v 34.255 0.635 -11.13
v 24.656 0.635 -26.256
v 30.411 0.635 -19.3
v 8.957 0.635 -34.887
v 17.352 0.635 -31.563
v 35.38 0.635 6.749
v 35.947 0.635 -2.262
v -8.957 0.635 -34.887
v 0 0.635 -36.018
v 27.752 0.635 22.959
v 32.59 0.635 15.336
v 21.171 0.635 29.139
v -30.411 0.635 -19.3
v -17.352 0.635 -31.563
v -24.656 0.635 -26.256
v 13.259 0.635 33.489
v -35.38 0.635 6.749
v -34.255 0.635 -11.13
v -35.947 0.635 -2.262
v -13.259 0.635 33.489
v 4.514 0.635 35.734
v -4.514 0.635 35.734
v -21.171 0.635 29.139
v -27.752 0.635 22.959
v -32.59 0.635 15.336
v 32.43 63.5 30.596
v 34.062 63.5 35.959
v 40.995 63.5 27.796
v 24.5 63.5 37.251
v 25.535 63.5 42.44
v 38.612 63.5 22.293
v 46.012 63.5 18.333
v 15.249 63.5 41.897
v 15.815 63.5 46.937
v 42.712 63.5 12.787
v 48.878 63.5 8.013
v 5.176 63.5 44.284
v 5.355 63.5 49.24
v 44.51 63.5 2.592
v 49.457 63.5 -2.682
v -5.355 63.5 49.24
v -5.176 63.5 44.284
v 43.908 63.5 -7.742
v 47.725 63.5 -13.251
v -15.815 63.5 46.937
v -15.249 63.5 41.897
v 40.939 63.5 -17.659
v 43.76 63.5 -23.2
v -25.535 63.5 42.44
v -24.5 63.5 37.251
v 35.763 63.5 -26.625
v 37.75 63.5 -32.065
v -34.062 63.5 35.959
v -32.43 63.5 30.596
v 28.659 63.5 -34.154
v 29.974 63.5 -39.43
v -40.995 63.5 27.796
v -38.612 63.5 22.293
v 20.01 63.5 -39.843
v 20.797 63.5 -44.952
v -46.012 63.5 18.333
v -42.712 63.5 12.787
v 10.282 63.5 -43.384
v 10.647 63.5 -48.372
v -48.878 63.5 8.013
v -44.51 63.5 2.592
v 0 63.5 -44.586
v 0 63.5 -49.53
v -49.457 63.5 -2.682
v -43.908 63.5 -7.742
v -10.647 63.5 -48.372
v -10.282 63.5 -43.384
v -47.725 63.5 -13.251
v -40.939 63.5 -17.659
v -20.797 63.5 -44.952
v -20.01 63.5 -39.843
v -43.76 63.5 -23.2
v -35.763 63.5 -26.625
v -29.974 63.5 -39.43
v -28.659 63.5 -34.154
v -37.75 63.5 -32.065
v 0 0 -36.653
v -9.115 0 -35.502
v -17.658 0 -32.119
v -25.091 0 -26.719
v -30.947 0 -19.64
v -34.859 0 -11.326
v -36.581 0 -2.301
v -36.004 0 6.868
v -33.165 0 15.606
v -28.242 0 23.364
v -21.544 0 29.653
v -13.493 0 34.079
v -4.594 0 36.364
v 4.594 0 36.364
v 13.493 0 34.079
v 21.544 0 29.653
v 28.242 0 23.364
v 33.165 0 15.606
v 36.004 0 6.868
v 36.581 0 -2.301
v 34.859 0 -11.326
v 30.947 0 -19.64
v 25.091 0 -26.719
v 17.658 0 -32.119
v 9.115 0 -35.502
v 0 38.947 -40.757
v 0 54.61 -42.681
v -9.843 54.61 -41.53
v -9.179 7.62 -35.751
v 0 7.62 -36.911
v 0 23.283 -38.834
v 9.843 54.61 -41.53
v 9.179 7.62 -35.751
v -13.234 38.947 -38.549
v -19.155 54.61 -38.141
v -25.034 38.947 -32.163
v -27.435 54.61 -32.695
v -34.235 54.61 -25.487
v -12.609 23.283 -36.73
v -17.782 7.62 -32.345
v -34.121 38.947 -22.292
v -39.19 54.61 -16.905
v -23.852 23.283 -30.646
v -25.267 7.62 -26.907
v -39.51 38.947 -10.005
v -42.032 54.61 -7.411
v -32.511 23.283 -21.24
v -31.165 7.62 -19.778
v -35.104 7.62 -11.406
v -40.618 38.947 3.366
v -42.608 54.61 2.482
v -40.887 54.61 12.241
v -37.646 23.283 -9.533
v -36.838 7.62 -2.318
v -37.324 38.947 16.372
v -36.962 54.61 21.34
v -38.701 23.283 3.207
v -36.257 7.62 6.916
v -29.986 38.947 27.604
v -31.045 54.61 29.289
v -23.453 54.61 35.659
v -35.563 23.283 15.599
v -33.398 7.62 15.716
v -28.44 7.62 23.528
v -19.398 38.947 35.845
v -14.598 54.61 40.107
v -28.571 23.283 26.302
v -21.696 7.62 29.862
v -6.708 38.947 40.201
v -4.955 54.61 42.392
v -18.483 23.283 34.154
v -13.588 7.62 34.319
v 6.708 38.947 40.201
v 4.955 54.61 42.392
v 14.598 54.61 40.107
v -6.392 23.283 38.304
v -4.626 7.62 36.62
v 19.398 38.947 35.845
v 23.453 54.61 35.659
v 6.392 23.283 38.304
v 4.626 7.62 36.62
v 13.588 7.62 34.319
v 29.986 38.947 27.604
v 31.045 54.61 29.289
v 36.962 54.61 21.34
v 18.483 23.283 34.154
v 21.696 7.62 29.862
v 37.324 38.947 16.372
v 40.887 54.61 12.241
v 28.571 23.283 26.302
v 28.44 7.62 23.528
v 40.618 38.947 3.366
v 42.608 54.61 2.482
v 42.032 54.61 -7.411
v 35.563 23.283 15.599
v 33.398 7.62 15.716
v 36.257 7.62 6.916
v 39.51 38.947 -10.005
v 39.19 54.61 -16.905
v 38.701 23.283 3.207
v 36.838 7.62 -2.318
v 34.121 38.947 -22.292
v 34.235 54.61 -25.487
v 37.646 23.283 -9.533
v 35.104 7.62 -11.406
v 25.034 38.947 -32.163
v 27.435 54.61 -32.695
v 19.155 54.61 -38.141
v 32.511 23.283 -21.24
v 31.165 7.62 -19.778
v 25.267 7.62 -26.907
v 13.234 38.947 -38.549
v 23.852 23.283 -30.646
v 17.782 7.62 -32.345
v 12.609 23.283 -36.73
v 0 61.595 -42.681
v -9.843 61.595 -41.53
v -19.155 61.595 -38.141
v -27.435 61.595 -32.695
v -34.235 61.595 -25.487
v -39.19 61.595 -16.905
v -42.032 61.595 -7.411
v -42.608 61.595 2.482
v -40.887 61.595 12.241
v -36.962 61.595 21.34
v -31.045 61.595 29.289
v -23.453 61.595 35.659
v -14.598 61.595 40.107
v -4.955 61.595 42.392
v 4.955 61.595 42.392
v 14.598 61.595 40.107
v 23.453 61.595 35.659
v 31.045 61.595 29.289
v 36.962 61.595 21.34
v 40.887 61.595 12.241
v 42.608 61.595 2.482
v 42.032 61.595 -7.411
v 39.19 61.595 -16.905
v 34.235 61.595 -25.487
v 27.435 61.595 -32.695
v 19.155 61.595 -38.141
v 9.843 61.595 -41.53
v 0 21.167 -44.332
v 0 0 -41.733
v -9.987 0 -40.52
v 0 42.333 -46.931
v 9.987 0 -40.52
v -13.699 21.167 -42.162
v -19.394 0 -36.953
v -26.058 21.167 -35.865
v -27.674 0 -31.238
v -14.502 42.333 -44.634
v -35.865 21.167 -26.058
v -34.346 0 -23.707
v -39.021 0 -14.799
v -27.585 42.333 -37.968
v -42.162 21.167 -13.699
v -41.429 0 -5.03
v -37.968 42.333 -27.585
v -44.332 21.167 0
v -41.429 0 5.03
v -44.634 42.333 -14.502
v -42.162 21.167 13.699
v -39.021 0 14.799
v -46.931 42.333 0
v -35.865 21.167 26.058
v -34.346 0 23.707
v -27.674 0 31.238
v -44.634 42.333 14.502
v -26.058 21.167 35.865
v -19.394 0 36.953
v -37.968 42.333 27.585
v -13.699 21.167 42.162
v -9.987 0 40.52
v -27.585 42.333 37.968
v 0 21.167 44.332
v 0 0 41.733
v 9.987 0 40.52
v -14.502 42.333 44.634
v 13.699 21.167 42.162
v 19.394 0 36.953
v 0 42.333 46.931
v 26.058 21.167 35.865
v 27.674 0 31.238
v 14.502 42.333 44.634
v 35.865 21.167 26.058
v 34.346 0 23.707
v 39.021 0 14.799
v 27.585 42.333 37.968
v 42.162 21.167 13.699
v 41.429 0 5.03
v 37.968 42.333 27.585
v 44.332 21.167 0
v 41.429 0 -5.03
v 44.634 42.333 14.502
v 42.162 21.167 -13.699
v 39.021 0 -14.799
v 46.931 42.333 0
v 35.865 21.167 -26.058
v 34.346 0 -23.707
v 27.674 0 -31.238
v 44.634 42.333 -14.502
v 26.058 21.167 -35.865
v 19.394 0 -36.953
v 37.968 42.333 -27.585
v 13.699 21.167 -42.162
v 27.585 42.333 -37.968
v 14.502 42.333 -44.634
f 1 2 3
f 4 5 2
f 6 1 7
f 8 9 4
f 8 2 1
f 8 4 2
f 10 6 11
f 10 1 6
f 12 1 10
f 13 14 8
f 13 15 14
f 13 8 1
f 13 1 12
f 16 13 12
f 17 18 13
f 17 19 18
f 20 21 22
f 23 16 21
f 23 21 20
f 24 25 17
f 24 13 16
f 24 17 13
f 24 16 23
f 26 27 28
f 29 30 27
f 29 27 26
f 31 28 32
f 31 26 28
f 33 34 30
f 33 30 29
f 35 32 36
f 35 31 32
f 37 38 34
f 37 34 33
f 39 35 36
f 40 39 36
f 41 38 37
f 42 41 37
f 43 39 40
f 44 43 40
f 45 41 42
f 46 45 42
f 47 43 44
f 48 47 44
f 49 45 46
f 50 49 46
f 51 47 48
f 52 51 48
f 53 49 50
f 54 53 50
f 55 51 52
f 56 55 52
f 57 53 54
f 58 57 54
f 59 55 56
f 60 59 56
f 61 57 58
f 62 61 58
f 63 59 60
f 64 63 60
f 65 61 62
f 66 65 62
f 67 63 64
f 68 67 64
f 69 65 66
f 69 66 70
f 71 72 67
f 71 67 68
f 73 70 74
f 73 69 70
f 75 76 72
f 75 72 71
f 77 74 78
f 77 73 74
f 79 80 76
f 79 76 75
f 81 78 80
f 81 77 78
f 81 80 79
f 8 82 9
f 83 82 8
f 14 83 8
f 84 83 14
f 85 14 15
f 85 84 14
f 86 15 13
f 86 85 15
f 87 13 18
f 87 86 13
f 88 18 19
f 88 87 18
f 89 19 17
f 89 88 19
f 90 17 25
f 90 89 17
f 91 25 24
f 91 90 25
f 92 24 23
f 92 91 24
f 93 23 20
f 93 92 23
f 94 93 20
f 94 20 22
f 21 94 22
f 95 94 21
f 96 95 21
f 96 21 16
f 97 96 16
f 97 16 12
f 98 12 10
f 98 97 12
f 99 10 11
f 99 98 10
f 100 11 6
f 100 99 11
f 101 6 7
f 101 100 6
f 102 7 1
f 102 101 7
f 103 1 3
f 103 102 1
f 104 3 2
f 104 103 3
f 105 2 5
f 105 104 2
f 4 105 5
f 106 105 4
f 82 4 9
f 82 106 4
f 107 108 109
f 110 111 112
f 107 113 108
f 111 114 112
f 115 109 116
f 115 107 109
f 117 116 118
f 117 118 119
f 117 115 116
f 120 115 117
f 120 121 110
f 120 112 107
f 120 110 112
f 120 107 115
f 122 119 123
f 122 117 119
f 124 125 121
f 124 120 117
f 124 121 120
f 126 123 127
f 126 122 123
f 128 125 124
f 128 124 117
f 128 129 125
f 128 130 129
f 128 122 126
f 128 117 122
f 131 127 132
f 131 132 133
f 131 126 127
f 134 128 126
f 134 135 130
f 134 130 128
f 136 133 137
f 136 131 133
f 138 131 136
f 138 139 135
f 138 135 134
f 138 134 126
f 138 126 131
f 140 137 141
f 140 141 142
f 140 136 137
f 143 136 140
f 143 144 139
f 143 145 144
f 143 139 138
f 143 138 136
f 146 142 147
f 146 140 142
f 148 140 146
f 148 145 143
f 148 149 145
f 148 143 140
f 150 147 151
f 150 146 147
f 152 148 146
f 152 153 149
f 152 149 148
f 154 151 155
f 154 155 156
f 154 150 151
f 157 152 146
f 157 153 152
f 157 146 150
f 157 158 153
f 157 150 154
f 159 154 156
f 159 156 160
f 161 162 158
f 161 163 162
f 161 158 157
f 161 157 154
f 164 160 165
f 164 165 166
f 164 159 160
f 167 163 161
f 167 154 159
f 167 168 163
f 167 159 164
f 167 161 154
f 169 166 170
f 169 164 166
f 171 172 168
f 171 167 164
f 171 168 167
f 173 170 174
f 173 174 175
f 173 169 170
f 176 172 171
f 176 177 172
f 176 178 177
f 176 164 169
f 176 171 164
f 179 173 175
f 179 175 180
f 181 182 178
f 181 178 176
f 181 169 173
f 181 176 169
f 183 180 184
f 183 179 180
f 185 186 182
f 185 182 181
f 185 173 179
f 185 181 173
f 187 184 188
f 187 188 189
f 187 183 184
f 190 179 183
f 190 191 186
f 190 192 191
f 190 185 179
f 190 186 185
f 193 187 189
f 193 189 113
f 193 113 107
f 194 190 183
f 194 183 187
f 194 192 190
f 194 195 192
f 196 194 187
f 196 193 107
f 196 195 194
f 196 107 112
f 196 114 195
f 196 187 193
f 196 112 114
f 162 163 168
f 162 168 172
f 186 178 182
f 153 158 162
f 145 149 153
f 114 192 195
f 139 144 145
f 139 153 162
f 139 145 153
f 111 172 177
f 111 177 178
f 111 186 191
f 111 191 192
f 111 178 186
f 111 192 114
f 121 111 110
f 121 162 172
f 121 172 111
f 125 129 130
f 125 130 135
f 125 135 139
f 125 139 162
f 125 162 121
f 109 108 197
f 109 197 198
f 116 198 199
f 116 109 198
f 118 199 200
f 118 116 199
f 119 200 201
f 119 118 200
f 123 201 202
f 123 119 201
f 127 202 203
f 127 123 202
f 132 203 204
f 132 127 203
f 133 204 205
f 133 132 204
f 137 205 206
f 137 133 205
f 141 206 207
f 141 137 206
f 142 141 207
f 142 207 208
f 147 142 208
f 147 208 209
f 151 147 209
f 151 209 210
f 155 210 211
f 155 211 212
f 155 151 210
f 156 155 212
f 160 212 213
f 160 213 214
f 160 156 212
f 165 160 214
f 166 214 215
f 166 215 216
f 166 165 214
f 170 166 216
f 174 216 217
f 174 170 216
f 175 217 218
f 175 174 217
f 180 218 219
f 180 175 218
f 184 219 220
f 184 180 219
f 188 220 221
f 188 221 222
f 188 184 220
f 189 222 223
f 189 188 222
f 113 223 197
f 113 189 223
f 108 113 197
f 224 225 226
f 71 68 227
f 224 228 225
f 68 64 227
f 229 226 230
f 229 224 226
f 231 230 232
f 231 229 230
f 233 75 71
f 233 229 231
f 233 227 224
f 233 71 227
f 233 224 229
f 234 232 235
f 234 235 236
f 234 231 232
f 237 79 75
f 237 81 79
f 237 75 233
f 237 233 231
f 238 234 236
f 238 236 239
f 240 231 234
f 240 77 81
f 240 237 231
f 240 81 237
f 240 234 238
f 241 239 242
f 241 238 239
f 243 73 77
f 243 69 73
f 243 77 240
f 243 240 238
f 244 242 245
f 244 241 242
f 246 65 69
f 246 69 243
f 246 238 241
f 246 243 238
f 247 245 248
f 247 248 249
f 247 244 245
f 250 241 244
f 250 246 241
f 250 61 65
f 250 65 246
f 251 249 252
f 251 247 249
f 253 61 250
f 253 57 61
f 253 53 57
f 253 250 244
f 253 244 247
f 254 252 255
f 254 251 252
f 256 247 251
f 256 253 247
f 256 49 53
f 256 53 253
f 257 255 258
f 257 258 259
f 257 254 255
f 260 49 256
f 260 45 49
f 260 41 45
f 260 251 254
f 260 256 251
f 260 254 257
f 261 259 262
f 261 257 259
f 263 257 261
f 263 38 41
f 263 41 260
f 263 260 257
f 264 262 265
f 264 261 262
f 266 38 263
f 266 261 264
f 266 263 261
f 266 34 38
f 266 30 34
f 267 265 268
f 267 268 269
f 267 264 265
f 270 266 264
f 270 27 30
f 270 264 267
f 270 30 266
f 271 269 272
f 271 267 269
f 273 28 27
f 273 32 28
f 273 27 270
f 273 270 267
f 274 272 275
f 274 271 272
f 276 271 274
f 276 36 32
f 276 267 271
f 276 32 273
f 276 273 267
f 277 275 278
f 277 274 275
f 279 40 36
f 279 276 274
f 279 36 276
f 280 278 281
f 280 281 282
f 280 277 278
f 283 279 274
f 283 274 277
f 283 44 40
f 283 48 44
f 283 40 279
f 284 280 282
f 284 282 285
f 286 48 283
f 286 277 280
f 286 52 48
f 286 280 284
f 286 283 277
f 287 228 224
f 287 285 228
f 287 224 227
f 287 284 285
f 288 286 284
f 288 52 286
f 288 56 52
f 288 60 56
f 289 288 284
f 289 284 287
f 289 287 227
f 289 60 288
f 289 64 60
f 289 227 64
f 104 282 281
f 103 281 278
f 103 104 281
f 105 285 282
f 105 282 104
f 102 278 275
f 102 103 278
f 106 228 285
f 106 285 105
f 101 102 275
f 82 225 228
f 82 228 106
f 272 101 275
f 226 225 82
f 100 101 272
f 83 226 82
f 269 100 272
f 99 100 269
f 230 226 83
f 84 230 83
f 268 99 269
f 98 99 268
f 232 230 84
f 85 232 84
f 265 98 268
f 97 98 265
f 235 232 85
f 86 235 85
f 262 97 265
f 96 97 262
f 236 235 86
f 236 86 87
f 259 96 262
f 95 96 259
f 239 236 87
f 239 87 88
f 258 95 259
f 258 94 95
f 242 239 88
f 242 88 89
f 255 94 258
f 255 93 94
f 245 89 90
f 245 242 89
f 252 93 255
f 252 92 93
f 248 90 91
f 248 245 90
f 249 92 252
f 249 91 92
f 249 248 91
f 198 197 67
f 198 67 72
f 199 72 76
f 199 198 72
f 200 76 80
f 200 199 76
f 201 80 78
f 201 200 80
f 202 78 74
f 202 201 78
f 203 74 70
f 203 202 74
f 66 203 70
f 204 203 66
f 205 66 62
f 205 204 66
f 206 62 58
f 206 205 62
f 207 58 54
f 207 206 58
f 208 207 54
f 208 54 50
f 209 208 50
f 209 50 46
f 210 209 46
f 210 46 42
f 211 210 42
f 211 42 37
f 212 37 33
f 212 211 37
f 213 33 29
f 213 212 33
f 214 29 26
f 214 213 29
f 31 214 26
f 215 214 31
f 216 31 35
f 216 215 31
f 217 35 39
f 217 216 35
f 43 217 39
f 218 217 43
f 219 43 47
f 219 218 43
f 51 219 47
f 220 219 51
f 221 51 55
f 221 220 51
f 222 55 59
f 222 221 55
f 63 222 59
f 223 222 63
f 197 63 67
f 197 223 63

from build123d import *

# Parameters (mm, degrees)
CHAMFER1_SIZE = 1.905


with BuildPart() as part:
    # Sketch1 → Revolve1 (revolve)
    with BuildSketch(Plane(origin=(0, 0, 0), x_dir=(0, 0, -1), z_dir=(1, 0, 0))):
        Polygon((41.733180383, 0), (49.53, 63.5), (42.680526601, 63.5), (42.680526601, 54.61), (36.910880084, 7.62), (0, 7.62), (0, 0.635), (36.018180383, 0.635), (36.653180383, 0), align=None)
    revolve(axis=Axis((0, 0, 0), (0, 1, 0)))

    # Chamfer1
    chamfer1_edges = [part.edges().sort_by_distance(p)[0] for p in [
        (0, 63.5, 42.680526601),
    ]]
    chamfer(chamfer1_edges, length=CHAMFER1_SIZE)


solid = part.part
